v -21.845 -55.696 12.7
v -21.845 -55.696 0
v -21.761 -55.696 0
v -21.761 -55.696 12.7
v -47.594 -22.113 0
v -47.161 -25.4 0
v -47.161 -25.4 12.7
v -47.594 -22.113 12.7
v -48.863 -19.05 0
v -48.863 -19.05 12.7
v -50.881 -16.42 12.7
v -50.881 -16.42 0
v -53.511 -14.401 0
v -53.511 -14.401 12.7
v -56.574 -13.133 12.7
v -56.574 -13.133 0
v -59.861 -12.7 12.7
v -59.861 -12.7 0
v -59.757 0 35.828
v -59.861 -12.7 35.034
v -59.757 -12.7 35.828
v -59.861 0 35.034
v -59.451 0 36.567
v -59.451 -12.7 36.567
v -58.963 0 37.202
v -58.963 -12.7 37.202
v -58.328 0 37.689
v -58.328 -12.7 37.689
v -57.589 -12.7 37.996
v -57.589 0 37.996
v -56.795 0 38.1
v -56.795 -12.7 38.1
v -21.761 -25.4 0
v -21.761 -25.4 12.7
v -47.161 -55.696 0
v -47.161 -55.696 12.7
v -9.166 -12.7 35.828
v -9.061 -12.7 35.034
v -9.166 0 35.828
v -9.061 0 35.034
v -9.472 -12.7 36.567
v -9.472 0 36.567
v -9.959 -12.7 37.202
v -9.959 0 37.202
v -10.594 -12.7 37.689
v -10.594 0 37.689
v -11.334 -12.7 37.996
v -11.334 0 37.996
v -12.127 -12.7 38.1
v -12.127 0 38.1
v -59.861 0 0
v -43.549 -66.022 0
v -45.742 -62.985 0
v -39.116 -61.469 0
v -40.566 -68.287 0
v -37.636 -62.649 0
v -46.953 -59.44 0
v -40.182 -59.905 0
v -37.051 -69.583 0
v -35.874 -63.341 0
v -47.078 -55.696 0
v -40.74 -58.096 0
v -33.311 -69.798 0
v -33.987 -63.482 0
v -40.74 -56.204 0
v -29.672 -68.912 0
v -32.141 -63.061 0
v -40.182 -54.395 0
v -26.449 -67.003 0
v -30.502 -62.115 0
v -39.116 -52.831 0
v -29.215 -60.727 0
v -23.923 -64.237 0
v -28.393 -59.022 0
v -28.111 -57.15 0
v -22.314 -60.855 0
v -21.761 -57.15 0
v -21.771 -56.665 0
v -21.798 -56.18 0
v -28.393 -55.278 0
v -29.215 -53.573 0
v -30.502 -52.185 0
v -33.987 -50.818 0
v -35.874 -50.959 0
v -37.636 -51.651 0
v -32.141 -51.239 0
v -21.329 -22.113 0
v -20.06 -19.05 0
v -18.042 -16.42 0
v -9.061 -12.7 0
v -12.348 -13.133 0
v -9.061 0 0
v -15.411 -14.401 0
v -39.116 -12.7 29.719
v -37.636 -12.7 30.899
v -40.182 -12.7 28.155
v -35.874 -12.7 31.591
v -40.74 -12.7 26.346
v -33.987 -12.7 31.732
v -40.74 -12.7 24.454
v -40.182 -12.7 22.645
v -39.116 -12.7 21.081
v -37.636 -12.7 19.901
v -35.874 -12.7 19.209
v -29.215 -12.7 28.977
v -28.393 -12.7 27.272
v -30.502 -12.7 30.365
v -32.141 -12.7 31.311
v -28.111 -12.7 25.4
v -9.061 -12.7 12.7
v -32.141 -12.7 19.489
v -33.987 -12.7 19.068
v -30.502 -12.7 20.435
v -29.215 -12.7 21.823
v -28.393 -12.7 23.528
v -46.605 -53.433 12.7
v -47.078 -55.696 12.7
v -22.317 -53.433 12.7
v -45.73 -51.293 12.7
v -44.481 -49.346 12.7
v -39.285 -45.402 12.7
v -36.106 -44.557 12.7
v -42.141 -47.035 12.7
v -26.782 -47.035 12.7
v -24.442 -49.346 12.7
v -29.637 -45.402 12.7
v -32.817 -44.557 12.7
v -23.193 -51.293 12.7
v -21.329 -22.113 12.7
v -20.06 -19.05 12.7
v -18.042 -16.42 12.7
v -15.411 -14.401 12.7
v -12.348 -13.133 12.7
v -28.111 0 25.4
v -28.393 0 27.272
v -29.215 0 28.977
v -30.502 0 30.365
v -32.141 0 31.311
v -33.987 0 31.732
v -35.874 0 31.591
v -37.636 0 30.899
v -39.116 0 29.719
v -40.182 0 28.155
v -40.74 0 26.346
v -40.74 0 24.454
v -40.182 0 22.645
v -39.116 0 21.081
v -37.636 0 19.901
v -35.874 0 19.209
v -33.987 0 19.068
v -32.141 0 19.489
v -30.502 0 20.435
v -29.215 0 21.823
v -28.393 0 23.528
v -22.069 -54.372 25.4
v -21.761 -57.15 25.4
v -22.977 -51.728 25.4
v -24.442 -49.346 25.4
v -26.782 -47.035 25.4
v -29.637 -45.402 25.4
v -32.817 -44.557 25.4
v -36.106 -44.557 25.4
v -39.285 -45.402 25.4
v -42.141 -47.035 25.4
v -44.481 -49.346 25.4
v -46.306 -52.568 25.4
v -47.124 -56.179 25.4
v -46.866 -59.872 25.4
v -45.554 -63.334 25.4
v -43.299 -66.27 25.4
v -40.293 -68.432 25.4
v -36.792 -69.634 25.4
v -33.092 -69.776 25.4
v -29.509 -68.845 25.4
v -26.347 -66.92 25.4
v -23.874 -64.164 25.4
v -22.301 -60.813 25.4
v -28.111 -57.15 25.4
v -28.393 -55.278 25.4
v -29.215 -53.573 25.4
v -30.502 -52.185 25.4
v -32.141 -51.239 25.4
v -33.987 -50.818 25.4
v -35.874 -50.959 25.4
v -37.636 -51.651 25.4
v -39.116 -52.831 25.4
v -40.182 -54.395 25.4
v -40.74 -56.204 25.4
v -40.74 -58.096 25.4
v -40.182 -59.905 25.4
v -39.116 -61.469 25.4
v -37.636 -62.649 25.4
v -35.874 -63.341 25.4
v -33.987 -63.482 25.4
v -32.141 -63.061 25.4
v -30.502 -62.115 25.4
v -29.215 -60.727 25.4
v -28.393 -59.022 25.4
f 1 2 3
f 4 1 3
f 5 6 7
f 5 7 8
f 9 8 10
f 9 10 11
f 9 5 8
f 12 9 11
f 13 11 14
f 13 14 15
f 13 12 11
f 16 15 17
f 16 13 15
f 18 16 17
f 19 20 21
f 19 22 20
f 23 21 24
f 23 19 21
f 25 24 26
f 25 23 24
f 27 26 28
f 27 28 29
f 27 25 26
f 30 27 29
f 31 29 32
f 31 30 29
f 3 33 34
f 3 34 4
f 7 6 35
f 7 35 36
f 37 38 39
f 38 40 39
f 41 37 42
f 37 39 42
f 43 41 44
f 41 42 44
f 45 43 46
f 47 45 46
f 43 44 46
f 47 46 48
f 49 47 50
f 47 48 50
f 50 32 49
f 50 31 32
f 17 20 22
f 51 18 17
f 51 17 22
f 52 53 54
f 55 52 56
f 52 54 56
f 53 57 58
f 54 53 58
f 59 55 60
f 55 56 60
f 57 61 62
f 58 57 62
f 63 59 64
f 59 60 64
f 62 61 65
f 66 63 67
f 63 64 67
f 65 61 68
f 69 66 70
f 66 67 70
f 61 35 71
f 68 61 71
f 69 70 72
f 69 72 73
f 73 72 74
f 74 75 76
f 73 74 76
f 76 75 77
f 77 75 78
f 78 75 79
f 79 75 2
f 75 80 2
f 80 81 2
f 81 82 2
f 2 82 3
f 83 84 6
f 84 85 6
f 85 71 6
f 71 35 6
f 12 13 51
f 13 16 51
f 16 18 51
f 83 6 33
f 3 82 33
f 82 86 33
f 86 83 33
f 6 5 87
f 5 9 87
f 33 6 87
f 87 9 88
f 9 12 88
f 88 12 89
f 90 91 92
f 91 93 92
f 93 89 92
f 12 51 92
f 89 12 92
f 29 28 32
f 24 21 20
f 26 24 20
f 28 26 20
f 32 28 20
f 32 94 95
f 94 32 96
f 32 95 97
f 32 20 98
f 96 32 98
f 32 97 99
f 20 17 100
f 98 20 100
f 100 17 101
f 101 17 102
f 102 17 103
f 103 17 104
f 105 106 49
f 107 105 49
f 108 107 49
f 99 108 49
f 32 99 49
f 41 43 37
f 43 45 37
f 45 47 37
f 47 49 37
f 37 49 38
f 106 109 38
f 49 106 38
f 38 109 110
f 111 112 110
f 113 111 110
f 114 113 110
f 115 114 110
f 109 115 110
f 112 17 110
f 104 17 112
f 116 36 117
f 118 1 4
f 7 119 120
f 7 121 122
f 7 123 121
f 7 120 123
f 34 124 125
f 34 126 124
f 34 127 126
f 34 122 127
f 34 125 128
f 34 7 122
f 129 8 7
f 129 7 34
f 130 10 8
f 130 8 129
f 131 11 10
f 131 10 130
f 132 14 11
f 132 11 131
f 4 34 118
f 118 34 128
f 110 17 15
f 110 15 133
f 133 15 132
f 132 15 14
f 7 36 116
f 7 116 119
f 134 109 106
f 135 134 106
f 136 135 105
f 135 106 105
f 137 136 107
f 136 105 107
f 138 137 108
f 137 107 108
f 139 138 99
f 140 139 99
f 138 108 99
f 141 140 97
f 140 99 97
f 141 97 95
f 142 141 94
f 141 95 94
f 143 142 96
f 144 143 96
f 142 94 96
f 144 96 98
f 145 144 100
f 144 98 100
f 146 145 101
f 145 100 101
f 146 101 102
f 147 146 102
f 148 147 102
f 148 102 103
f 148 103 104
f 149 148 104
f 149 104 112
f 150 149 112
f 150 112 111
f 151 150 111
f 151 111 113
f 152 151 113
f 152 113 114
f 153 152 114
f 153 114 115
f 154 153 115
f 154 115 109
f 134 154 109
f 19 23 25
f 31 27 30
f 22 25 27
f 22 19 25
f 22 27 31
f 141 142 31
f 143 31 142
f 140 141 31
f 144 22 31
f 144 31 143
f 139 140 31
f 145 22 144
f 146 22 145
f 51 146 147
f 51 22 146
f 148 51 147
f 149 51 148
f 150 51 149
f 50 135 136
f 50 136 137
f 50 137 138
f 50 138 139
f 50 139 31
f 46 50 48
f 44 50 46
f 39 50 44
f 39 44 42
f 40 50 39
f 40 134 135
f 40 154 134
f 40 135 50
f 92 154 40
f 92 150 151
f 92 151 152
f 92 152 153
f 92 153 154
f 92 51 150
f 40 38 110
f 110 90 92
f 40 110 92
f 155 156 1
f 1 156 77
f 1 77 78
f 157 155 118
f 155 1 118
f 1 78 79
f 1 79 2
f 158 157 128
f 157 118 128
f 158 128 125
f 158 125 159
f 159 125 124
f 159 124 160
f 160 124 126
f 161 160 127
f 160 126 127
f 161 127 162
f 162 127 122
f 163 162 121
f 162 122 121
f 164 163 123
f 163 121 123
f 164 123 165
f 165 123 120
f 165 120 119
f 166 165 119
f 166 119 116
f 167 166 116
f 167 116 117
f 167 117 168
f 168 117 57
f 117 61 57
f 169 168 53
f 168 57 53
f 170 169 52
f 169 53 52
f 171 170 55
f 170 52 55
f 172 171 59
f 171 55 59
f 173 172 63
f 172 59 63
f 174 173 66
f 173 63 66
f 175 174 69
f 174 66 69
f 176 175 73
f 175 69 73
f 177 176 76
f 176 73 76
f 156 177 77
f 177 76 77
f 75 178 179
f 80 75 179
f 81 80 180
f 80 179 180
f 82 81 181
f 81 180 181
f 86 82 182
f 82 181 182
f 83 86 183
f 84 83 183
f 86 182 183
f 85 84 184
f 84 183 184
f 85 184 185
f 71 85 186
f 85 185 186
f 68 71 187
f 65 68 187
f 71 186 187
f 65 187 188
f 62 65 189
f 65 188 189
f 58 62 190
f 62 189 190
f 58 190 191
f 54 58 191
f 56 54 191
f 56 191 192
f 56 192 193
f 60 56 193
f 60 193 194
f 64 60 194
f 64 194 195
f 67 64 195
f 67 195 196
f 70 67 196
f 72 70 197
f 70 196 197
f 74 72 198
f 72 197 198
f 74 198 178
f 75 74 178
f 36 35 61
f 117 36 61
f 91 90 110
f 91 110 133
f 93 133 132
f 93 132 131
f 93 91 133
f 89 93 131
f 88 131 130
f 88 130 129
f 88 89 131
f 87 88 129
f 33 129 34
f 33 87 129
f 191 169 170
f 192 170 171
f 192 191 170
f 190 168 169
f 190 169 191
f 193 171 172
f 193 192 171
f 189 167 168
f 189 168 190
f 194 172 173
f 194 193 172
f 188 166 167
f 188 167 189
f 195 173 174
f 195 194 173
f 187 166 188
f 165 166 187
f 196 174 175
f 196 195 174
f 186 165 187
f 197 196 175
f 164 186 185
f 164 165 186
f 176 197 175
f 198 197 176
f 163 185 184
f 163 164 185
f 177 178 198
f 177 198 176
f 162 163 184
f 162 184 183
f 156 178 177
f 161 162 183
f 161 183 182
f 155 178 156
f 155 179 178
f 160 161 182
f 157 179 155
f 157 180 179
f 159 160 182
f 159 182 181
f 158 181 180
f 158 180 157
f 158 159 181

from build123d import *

# Parameters (mm, degrees)
F0_W      = 50.8
F0_H      = 12.7
F1_DEPTH  = 38.1
F2_W      = 25.4
F2_H      = 23.9464748895
F3_DEPTH  = 12.7
F5_DEPTH  = 12.7
F6_DEPTH  = 25.4
F7_DEPTH  = 6.35
F8_R      = 6.35
F9_DEPTH  = 25.4
F10_R     = 6.35
F11_DEPTH = 25.4
F12_R     = 3.0660512242


with BuildPart() as f1:
    # F0 (on Top) → F1 (new body)
    with BuildSketch(Plane.XY):
        with Locations((-34.4613061011, -6.35)):
            Rectangle(F0_W, F0_H)
    extrude(amount=F1_DEPTH)

    # F2 (on face) → F3 (join)
    with BuildSketch(Plane(origin=(0, 0, 0), x_dir=(1, 0, 0), z_dir=(0, 0, -1))):
        with BuildLine():
            ThreePointArc((-47.1613061011, 25.4), (-50.88104998, 16.4197438789), (-59.8613061011, 12.7))
            Line((-59.8613061011, 12.7), (-9.0613061011, 12.7))
            ThreePointArc((-9.0613061011, 12.7), (-18.0415622222, 16.4197438789), (-21.7613061011, 25.4))
            Line((-21.7613061011, 25.4), (-47.1613061011, 25.4))
        make_face()
        with Locations((-34.4613061011, 37.3732374447)):
            Rectangle(F2_W, F2_H)
    extrude(amount=-F3_DEPTH)

    # F4 (on face) → F5 (join)
    with BuildSketch(Plane.XY.offset(12.7)):
        with BuildLine():
            Line((-44.4810364292, -49.3464748895), (-24.4415757729, -49.3464748895))
            ThreePointArc((-24.4415757729, -49.3464748895), (-34.4613061011, -44.45), (-44.4810364292, -49.3464748895))
        make_face()
        with BuildLine():
            ThreePointArc((-44.4810364292, -49.3464748895), (-38.5868015157, -69.1612567029), (-21.7613061011, -57.15))
            ThreePointArc((-21.7613061011, -57.15), (-22.4500493981, -53.0245045854), (-24.4415757729, -49.3464748895))
            Line((-24.4415757729, -49.3464748895), (-44.4810364292, -49.3464748895))
        make_face()
    extrude(amount=F5_DEPTH)

    # F6 (add): a face of the model
    f6_faces = [f1.faces().sort_by_distance(p)[0] for p in [
        (-34.4613061011, -57.15, 25.4),
    ]]
    extrude(f6_faces, amount=-F6_DEPTH)

    # F7 (add): faces of the model
    f7_faces = [f1.faces().sort_by_distance(p)[0] for p in [
        (-45.8211712652, -49.3464748895, 6.35),
        (-23.101440937, -49.3464748895, 6.35),
    ]]
    extrude(f7_faces, amount=F7_DEPTH)

    # F8 (on face) → F9 (cut)
    with BuildSketch(Plane.XY.offset(25.4)):
        with Locations((-34.4613061011, -57.15)):
            Circle(F8_R)
    extrude(amount=-F9_DEPTH, mode=Mode.SUBTRACT)

    # F10 (on face) → F11 (cut)
    with BuildSketch(Plane.XZ.offset(12.7)):
        with Locations((-34.4613061011, 25.4)):
            Circle(F10_R)
    extrude(amount=-F11_DEPTH, mode=Mode.SUBTRACT)

    # F12
    f12_edges = [f1.edges().sort_by_distance(p)[0] for p in [
        (-59.861306, -6.35, 38.1),
        (-9.061306, -6.35, 38.1),
    ]]
    fillet(f12_edges, radius=F12_R)


solid = f1.part
